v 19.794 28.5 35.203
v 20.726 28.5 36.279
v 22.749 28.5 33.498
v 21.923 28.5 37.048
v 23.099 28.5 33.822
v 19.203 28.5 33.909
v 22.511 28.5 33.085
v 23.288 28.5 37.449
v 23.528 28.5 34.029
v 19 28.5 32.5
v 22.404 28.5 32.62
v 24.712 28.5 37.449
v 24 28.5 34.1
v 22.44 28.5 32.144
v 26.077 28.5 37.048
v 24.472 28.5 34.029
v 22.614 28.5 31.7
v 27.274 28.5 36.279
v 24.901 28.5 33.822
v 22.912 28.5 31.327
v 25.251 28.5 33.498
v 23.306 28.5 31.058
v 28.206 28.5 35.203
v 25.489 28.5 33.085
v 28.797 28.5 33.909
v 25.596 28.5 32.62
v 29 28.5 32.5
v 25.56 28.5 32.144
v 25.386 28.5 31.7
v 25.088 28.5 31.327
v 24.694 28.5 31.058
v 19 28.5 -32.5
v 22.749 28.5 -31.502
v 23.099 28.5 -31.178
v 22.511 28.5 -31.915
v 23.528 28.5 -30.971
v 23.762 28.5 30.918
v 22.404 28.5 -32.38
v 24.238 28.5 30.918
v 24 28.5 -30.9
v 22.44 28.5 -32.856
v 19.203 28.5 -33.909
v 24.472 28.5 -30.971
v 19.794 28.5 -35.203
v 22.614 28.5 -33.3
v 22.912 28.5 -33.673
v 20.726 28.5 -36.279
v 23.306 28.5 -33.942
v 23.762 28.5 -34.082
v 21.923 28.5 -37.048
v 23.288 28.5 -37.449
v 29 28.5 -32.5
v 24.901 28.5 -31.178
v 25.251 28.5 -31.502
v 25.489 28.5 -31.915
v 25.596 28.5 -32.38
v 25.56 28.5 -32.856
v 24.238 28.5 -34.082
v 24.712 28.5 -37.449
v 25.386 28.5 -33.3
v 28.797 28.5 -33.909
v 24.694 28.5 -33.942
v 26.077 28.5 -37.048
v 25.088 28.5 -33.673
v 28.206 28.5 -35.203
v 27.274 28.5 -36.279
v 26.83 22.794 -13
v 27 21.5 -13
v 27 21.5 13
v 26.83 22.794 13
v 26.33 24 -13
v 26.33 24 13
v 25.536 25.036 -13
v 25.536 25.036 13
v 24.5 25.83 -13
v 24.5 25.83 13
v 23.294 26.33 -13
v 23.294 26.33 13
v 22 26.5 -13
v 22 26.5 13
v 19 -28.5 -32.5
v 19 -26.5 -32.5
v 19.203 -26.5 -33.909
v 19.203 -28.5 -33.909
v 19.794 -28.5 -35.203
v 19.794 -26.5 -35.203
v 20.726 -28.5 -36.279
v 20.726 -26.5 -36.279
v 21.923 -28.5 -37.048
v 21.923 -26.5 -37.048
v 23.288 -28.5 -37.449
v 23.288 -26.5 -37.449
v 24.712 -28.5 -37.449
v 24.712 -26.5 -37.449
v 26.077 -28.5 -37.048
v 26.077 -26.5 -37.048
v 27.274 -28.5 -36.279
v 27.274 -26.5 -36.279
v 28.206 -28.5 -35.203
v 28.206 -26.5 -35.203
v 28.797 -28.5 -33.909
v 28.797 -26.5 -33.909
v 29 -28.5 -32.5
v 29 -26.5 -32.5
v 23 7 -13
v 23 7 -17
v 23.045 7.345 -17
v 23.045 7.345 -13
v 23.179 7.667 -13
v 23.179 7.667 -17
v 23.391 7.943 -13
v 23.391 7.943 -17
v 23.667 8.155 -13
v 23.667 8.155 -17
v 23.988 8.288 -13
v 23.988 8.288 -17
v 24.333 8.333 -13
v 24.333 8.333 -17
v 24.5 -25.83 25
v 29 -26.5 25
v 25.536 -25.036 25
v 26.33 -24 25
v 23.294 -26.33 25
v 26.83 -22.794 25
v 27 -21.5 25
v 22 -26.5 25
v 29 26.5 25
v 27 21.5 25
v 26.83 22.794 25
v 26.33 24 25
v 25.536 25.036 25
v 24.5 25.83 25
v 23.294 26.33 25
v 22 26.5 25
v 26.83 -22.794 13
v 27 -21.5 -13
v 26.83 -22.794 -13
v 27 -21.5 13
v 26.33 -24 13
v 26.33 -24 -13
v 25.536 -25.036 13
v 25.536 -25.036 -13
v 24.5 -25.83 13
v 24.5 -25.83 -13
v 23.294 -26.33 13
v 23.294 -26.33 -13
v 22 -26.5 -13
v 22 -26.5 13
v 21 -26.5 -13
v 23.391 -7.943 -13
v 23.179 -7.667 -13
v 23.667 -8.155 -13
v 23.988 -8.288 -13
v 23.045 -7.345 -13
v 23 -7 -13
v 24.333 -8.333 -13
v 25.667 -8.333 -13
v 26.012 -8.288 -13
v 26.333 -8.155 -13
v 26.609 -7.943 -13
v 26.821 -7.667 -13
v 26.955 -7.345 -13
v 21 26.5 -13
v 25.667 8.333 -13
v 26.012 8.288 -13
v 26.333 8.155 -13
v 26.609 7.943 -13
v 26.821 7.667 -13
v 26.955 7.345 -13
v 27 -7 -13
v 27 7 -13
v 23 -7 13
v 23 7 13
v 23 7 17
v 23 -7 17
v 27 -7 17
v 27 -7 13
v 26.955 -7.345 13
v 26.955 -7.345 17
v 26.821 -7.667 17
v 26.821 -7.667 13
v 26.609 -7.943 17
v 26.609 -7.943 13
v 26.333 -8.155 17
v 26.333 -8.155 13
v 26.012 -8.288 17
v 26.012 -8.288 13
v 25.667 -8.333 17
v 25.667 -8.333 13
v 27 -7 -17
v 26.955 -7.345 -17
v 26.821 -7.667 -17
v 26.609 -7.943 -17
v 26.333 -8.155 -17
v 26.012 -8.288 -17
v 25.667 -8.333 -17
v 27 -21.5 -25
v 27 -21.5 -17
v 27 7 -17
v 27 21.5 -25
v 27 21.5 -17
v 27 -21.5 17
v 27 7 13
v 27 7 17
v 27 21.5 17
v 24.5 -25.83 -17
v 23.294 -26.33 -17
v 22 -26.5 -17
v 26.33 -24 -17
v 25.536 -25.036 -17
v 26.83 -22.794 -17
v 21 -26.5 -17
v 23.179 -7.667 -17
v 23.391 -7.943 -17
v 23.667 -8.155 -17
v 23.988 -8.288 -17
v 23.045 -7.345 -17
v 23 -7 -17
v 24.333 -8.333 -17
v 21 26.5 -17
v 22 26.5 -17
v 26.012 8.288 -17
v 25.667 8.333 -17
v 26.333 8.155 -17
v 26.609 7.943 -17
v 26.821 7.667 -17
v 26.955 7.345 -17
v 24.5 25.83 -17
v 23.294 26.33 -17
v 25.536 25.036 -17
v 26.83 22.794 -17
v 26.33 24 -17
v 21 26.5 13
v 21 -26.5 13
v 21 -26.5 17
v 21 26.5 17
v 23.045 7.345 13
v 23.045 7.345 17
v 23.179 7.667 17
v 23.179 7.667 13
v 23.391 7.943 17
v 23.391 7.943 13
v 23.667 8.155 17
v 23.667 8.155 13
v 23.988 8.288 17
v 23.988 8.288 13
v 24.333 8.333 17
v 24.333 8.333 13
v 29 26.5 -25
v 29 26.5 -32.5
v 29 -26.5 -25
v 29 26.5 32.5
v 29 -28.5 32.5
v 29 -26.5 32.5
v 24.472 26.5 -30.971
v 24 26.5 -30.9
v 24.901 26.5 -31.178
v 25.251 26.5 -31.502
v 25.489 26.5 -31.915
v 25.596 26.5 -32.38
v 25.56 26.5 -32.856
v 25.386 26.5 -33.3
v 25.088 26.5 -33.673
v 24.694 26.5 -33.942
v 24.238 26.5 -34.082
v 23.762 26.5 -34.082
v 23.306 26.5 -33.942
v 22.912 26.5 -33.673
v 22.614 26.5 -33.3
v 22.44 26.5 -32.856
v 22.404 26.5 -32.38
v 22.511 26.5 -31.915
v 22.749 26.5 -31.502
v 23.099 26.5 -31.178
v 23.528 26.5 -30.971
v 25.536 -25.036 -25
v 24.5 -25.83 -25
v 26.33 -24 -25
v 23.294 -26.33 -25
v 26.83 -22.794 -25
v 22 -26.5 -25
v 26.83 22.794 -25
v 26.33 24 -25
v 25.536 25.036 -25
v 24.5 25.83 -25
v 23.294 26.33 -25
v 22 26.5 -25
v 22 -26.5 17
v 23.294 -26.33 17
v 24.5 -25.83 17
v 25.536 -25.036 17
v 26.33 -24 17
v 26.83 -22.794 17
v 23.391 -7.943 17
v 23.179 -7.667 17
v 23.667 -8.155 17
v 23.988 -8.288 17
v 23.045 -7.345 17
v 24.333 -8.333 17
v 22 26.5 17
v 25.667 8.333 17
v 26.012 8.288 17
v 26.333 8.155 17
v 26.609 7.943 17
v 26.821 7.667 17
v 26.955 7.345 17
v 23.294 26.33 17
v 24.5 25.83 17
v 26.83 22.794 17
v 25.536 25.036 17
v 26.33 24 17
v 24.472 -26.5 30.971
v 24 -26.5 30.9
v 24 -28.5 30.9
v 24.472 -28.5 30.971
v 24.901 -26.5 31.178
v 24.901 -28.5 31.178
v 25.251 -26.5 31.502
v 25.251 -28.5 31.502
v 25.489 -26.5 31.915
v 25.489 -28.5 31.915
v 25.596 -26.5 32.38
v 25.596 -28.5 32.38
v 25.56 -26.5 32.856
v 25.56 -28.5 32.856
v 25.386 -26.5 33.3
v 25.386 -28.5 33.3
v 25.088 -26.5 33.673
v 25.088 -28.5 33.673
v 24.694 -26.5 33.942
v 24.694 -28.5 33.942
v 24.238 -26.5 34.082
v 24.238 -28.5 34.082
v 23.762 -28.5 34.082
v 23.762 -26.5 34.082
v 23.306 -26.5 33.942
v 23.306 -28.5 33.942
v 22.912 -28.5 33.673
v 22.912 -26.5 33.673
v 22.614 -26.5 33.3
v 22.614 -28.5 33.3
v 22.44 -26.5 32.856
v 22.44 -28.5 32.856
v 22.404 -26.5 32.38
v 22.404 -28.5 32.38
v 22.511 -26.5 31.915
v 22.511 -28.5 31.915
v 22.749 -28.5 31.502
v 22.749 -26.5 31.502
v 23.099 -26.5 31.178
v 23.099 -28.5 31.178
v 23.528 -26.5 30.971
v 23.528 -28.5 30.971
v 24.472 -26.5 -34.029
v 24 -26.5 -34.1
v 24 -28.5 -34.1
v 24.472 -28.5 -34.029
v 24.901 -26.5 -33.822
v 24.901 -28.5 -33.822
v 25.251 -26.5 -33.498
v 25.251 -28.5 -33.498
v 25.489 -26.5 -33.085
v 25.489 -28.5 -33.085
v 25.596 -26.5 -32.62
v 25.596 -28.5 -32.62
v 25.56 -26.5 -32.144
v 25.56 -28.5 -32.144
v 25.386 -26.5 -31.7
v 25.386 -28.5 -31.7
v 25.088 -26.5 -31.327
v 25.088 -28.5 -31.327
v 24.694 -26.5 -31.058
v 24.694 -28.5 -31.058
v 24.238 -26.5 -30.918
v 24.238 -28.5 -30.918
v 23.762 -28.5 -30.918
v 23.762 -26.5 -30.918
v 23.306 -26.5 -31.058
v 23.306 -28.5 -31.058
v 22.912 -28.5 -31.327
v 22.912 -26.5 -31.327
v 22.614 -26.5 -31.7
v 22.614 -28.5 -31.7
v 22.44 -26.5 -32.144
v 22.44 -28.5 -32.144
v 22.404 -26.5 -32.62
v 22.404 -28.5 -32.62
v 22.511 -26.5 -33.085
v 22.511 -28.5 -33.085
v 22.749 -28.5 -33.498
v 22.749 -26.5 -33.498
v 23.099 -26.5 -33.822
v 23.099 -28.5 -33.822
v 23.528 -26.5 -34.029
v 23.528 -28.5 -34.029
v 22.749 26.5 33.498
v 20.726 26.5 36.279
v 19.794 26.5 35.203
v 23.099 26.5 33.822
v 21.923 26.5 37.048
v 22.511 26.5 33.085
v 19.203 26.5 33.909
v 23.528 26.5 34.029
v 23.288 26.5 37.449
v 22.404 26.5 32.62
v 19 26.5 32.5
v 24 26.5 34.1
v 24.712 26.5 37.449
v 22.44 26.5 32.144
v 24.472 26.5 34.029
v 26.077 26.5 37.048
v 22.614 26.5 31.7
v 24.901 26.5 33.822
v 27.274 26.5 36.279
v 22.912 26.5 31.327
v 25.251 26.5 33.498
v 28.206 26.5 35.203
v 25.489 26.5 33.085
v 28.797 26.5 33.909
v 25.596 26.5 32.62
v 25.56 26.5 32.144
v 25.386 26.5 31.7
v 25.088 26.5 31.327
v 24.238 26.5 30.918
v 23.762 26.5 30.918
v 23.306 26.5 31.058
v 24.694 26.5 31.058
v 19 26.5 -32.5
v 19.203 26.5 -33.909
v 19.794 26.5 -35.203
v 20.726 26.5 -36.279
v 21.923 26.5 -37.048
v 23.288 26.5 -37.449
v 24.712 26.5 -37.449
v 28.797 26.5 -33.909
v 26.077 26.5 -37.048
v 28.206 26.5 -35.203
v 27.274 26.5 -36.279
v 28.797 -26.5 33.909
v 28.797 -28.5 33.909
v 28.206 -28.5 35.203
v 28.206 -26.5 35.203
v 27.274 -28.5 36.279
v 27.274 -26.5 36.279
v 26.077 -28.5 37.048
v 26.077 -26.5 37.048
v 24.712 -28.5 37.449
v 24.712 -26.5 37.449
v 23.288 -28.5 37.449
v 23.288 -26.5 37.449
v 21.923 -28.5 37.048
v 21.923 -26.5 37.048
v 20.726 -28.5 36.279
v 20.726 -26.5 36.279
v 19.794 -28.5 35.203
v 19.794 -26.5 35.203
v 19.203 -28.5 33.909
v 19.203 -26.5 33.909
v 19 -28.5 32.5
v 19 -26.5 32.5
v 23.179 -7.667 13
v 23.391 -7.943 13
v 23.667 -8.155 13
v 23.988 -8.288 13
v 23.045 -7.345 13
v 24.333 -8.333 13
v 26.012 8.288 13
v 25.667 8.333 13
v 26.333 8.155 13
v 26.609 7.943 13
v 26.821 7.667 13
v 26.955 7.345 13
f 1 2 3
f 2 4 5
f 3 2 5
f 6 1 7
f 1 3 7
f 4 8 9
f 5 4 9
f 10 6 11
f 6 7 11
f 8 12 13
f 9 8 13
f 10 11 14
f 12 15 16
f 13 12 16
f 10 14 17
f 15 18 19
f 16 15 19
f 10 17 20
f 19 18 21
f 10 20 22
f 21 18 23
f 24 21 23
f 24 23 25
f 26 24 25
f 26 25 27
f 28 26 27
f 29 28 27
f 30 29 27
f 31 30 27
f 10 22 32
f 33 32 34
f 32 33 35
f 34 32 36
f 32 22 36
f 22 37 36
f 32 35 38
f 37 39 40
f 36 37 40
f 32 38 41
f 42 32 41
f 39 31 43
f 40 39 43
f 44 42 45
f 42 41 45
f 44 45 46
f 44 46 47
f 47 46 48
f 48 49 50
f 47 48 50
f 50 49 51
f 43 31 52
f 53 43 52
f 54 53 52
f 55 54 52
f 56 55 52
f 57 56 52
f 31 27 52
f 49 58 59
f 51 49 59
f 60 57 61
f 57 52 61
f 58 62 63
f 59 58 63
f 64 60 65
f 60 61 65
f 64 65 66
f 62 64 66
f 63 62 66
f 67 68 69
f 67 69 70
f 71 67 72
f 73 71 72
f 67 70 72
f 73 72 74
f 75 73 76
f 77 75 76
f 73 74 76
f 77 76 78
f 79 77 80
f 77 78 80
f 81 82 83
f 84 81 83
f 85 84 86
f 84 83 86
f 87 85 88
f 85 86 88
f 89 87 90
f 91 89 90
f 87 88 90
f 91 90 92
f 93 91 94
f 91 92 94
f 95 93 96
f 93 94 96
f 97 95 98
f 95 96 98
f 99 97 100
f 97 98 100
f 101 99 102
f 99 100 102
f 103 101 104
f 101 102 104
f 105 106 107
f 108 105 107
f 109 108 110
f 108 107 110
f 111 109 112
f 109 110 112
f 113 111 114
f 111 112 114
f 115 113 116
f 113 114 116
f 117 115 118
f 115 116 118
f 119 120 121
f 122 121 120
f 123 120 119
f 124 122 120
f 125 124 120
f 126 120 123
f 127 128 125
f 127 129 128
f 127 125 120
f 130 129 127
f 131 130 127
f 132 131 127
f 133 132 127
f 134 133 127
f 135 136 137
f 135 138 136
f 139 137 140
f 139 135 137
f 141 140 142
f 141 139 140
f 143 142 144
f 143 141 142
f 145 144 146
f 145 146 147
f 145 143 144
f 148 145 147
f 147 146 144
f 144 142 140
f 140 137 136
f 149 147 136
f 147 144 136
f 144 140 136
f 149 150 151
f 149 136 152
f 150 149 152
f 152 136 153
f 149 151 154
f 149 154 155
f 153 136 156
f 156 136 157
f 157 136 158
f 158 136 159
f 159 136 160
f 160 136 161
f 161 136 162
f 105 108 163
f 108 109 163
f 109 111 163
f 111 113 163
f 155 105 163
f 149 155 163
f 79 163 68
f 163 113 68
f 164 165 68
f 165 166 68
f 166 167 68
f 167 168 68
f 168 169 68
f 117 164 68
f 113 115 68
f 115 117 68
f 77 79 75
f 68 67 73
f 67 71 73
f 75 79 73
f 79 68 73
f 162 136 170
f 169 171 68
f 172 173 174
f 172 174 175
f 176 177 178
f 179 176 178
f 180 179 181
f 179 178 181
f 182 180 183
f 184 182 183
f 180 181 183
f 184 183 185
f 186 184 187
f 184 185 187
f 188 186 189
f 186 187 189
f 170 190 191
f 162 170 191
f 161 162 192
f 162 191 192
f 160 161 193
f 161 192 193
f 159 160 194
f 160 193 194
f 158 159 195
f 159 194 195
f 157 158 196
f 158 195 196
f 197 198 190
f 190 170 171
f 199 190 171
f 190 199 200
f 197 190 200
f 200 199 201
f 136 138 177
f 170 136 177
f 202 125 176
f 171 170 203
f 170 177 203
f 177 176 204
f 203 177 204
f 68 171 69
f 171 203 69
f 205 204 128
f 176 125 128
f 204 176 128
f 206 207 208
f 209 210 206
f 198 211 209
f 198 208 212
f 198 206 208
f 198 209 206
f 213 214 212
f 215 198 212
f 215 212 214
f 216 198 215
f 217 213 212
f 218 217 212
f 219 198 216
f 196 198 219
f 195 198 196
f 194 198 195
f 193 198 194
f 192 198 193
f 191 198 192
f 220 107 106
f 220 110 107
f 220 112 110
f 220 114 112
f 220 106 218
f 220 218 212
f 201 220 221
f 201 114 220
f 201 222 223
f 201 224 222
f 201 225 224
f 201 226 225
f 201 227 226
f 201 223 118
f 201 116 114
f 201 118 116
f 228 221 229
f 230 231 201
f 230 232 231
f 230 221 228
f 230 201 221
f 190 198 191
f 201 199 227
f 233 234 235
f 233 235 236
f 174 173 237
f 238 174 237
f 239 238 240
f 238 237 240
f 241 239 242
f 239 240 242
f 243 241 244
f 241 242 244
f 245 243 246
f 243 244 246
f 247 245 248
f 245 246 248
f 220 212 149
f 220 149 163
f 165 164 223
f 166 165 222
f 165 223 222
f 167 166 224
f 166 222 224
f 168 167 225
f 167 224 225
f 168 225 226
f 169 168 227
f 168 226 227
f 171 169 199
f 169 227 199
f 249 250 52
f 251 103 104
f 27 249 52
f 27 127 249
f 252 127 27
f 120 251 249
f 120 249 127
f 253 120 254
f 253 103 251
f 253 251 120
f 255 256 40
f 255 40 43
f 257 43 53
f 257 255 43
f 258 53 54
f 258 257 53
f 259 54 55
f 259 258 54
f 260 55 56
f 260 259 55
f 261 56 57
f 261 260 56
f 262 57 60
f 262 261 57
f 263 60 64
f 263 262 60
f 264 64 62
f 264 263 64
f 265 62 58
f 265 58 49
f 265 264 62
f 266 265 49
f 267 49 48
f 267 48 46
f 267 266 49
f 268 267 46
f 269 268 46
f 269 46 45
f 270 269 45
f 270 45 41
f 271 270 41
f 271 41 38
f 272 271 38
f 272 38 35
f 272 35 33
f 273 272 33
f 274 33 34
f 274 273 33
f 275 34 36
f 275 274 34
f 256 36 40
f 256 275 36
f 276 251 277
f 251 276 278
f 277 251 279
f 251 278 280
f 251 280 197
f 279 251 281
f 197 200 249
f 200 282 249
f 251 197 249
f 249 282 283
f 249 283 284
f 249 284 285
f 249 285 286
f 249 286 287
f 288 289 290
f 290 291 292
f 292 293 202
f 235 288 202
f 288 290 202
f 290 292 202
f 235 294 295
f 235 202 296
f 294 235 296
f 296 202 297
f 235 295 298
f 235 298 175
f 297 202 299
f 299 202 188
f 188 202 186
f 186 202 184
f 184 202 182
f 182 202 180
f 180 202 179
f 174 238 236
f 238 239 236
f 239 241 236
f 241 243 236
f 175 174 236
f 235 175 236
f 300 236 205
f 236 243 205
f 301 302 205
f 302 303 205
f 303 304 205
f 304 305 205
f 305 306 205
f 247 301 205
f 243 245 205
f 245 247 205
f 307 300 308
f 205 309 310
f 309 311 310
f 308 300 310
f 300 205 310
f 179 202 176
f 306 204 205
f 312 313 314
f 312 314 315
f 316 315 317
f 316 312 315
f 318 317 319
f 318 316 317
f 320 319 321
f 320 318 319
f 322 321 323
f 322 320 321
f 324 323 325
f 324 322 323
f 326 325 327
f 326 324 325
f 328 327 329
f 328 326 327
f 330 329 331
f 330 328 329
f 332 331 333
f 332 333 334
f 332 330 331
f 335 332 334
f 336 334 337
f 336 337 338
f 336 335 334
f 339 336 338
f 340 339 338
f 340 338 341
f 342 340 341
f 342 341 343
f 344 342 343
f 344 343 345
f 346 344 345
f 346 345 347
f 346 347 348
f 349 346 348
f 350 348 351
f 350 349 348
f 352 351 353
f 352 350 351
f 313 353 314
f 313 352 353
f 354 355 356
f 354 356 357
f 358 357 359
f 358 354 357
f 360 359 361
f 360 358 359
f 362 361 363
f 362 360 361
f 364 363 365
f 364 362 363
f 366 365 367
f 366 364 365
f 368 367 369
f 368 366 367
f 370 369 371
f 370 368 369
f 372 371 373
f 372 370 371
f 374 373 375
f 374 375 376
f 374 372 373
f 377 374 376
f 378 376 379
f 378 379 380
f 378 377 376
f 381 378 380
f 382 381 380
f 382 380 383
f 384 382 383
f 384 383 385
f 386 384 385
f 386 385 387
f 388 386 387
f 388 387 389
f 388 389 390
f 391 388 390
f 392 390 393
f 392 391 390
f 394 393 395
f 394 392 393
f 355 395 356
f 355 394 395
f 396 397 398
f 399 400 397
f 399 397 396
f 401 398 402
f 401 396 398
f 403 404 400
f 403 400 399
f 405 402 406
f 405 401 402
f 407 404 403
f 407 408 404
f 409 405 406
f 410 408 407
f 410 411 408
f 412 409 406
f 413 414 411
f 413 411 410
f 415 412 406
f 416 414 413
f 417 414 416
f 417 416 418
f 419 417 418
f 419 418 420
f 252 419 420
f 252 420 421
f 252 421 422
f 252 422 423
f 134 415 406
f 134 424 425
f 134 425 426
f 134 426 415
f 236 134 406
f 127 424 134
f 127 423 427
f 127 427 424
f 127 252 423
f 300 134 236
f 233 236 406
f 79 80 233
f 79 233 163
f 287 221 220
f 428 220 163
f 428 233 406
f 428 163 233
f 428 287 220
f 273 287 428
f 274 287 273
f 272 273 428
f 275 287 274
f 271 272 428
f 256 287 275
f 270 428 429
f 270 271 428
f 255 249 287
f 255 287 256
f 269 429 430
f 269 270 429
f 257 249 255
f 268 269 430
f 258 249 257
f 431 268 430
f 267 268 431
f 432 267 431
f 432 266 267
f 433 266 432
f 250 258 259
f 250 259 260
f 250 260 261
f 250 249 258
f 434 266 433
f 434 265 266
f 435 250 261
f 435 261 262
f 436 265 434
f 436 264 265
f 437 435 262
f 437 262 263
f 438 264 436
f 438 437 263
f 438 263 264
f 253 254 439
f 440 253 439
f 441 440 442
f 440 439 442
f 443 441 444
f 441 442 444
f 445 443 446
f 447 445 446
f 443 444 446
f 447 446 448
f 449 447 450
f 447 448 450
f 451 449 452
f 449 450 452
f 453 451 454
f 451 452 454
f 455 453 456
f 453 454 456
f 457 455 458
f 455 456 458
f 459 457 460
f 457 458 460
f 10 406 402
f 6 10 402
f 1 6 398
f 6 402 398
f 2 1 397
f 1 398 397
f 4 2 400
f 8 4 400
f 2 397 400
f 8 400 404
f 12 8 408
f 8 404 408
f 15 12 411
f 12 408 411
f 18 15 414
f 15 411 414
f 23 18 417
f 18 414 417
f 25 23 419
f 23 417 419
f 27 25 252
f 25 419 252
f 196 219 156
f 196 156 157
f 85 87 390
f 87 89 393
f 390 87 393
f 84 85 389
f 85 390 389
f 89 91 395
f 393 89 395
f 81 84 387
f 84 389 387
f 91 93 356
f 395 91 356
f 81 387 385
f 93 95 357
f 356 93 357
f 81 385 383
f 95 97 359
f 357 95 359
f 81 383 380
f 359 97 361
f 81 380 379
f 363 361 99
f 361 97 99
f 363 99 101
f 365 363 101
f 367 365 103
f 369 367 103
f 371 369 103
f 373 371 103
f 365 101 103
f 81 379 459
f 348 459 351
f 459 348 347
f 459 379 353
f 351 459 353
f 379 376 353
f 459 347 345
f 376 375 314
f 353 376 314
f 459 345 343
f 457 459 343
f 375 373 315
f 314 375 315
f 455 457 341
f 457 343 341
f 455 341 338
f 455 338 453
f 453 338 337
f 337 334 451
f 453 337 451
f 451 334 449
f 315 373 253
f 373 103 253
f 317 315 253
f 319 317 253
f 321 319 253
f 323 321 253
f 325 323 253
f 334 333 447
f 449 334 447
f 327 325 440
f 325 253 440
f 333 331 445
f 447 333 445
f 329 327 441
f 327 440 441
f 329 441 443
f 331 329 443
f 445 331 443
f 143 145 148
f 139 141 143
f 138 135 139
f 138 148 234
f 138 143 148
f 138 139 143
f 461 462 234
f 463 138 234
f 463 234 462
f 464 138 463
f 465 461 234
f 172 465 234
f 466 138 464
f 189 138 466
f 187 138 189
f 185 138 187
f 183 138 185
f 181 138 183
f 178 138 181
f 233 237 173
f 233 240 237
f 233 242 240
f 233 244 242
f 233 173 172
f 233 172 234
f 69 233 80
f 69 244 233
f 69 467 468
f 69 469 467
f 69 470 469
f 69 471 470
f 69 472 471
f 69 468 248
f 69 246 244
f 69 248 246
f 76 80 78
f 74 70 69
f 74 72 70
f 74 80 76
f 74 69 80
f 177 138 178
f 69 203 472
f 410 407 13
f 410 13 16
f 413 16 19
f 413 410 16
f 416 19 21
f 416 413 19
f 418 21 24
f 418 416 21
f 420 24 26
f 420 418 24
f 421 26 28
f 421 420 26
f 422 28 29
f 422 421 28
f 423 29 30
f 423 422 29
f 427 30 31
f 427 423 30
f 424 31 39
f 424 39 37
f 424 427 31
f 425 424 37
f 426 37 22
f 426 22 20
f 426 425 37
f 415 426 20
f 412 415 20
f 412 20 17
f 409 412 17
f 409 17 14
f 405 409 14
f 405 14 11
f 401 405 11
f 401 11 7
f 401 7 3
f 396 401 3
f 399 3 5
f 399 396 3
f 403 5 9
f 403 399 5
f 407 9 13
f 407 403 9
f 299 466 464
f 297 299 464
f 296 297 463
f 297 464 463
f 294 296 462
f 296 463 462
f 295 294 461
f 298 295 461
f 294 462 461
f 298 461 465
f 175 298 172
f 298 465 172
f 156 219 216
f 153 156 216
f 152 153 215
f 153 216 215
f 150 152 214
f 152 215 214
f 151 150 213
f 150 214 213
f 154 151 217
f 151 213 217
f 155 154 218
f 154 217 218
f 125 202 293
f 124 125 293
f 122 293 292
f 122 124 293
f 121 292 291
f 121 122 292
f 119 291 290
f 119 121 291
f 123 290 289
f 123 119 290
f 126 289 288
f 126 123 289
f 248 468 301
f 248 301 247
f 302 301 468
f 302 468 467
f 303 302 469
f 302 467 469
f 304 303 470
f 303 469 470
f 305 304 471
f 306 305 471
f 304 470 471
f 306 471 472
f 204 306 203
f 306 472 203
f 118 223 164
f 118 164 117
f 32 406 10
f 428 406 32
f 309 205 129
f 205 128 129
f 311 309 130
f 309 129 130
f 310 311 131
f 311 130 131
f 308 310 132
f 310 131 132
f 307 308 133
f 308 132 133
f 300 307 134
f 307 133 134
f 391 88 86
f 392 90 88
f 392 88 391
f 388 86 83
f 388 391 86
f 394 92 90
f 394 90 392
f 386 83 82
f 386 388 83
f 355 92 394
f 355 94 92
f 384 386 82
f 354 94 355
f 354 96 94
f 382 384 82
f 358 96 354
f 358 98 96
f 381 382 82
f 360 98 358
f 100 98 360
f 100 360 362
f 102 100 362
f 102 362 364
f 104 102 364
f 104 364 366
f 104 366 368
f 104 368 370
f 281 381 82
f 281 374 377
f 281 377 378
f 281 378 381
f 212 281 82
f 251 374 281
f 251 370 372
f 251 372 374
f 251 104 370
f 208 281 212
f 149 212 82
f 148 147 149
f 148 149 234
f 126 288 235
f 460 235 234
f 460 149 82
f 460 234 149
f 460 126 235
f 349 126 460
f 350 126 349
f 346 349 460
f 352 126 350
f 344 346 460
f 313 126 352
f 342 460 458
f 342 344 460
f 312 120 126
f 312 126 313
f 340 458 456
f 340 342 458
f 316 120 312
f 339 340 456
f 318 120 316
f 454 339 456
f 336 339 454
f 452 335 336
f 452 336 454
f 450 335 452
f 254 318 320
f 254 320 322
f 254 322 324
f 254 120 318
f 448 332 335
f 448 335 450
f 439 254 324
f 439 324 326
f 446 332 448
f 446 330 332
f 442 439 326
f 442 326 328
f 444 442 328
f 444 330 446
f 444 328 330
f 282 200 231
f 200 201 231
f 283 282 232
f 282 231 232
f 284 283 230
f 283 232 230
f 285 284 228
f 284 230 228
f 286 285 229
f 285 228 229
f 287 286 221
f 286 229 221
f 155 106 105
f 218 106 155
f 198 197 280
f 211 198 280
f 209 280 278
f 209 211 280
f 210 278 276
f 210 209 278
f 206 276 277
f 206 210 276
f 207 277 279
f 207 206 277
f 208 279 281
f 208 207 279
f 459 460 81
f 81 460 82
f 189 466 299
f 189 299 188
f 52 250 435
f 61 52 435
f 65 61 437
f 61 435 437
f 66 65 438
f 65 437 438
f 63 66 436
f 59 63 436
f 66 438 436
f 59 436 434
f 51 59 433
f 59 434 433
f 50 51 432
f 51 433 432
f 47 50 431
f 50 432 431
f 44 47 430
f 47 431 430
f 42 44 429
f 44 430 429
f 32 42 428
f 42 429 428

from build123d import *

# Parameters (mm, degrees)
SKETCH_W     = 53
SKETCH_H     = 50
PAD_DEPTH    = 2
SKETCH001_R  = 1.6
PAD001_DEPTH = 2
SKETCH002_R  = 1.6
PAD002_DEPTH = 2
SKETCH003_W  = 53
SKETCH003_H  = 4
PAD003_DEPTH = 6
POCKET_DEPTH = 50
FILLET_R     = 5


with BuildPart() as part:
    # Sketch → Pad (new body)
    with BuildSketch(Plane.YZ.offset(27)):
        Rectangle(SKETCH_W, SKETCH_H)
    extrude(amount=PAD_DEPTH)

    # Sketch001 (on Face4 of Pad) → Pad001 (join)
    with BuildSketch(Plane(origin=(27, -26.5, 0), x_dir=(0, 0, -1), z_dir=(0, -1, 0))):
        with BuildLine():
            Line((-32.5, 2), (32.5, 2))
            ThreePointArc((32.5, -8), (37.5, -3), (32.5, 2))
            Line((-32.5, -8), (32.5, -8))
            ThreePointArc((-32.5, 2), (-37.5, -3), (-32.5, -8))
        make_face()
        with Locations((-32.5, -3)):
            Circle(SKETCH001_R, mode=Mode.SUBTRACT)
        with Locations((32.5, -3)):
            Circle(SKETCH001_R, mode=Mode.SUBTRACT)
    extrude(amount=PAD001_DEPTH)

    # Sketch002 (on Face13 of Pad001) → Pad002 (join)
    with BuildSketch(Plane(origin=(27, 26.5, 0), x_dir=(0, 0, 1), z_dir=(0, 1, 0))):
        with BuildLine():
            Line((-32.5, 2), (32.5, 2))
            ThreePointArc((32.5, -8), (37.5, -3), (32.5, 2))
            Line((32.5, -8), (-32.5, -8))
            ThreePointArc((-32.5, 2), (-37.5, -3), (-32.5, -8))
        make_face()
        with Locations((-32.5, -3)):
            Circle(SKETCH002_R, mode=Mode.SUBTRACT)
        with Locations((32.5, -3)):
            Circle(SKETCH002_R, mode=Mode.SUBTRACT)
    extrude(amount=PAD002_DEPTH)

    # Sketch003 (on Face8 of Pad002) → Pad003 (join)
    with BuildSketch(Plane(origin=(27, 0, 0), x_dir=(0, 1, 0), z_dir=(-1, 0, 0))):
        with Locations((0, -15)):
            Rectangle(SKETCH003_W, SKETCH003_H)
        with Locations((0, 15)):
            Rectangle(SKETCH003_W, SKETCH003_H)
    extrude(amount=PAD003_DEPTH)

    # Sketch004 (on Face9 of Pad003) → Pocket (cut)
    with BuildSketch(Plane(origin=(27, 0, -17), x_dir=(0, 1, 0), z_dir=(0, 0, -1))):
        with BuildLine():
            ThreePointArc((-7, 0), (-7.942809, -0.390524), (-8.333333, -1.333333))
            Line((-8.333333, -2.666667), (-8.333333, -1.333333))
            ThreePointArc((-8.333333, -2.666667), (-7.942809, -3.609476), (-7, -4))
            Line((7, -4), (-7, -4))
            ThreePointArc((7, -4), (7.942809, -3.609476), (8.333333, -2.666667))
            Line((8.333333, -1.333333), (8.333333, -2.666667))
            ThreePointArc((8.333333, -1.333333), (7.942809, -0.390524), (7, 0))
            Line((-7, 0), (7, 0))
        make_face()
    extrude(amount=-POCKET_DEPTH, mode=Mode.SUBTRACT)

    # Fillet
    fillet_edges = [part.edges().sort_by_distance(p)[0] for p in [
        (27, 26.5, 0),
        (27, -26.5, 0),
        (27, 26.5, 21),
        (27, -26.5, 21),
        (27, -26.5, -21),
        (27, 26.5, -21),
    ]]
    fillet(fillet_edges, radius=FILLET_R)


solid = part.part
